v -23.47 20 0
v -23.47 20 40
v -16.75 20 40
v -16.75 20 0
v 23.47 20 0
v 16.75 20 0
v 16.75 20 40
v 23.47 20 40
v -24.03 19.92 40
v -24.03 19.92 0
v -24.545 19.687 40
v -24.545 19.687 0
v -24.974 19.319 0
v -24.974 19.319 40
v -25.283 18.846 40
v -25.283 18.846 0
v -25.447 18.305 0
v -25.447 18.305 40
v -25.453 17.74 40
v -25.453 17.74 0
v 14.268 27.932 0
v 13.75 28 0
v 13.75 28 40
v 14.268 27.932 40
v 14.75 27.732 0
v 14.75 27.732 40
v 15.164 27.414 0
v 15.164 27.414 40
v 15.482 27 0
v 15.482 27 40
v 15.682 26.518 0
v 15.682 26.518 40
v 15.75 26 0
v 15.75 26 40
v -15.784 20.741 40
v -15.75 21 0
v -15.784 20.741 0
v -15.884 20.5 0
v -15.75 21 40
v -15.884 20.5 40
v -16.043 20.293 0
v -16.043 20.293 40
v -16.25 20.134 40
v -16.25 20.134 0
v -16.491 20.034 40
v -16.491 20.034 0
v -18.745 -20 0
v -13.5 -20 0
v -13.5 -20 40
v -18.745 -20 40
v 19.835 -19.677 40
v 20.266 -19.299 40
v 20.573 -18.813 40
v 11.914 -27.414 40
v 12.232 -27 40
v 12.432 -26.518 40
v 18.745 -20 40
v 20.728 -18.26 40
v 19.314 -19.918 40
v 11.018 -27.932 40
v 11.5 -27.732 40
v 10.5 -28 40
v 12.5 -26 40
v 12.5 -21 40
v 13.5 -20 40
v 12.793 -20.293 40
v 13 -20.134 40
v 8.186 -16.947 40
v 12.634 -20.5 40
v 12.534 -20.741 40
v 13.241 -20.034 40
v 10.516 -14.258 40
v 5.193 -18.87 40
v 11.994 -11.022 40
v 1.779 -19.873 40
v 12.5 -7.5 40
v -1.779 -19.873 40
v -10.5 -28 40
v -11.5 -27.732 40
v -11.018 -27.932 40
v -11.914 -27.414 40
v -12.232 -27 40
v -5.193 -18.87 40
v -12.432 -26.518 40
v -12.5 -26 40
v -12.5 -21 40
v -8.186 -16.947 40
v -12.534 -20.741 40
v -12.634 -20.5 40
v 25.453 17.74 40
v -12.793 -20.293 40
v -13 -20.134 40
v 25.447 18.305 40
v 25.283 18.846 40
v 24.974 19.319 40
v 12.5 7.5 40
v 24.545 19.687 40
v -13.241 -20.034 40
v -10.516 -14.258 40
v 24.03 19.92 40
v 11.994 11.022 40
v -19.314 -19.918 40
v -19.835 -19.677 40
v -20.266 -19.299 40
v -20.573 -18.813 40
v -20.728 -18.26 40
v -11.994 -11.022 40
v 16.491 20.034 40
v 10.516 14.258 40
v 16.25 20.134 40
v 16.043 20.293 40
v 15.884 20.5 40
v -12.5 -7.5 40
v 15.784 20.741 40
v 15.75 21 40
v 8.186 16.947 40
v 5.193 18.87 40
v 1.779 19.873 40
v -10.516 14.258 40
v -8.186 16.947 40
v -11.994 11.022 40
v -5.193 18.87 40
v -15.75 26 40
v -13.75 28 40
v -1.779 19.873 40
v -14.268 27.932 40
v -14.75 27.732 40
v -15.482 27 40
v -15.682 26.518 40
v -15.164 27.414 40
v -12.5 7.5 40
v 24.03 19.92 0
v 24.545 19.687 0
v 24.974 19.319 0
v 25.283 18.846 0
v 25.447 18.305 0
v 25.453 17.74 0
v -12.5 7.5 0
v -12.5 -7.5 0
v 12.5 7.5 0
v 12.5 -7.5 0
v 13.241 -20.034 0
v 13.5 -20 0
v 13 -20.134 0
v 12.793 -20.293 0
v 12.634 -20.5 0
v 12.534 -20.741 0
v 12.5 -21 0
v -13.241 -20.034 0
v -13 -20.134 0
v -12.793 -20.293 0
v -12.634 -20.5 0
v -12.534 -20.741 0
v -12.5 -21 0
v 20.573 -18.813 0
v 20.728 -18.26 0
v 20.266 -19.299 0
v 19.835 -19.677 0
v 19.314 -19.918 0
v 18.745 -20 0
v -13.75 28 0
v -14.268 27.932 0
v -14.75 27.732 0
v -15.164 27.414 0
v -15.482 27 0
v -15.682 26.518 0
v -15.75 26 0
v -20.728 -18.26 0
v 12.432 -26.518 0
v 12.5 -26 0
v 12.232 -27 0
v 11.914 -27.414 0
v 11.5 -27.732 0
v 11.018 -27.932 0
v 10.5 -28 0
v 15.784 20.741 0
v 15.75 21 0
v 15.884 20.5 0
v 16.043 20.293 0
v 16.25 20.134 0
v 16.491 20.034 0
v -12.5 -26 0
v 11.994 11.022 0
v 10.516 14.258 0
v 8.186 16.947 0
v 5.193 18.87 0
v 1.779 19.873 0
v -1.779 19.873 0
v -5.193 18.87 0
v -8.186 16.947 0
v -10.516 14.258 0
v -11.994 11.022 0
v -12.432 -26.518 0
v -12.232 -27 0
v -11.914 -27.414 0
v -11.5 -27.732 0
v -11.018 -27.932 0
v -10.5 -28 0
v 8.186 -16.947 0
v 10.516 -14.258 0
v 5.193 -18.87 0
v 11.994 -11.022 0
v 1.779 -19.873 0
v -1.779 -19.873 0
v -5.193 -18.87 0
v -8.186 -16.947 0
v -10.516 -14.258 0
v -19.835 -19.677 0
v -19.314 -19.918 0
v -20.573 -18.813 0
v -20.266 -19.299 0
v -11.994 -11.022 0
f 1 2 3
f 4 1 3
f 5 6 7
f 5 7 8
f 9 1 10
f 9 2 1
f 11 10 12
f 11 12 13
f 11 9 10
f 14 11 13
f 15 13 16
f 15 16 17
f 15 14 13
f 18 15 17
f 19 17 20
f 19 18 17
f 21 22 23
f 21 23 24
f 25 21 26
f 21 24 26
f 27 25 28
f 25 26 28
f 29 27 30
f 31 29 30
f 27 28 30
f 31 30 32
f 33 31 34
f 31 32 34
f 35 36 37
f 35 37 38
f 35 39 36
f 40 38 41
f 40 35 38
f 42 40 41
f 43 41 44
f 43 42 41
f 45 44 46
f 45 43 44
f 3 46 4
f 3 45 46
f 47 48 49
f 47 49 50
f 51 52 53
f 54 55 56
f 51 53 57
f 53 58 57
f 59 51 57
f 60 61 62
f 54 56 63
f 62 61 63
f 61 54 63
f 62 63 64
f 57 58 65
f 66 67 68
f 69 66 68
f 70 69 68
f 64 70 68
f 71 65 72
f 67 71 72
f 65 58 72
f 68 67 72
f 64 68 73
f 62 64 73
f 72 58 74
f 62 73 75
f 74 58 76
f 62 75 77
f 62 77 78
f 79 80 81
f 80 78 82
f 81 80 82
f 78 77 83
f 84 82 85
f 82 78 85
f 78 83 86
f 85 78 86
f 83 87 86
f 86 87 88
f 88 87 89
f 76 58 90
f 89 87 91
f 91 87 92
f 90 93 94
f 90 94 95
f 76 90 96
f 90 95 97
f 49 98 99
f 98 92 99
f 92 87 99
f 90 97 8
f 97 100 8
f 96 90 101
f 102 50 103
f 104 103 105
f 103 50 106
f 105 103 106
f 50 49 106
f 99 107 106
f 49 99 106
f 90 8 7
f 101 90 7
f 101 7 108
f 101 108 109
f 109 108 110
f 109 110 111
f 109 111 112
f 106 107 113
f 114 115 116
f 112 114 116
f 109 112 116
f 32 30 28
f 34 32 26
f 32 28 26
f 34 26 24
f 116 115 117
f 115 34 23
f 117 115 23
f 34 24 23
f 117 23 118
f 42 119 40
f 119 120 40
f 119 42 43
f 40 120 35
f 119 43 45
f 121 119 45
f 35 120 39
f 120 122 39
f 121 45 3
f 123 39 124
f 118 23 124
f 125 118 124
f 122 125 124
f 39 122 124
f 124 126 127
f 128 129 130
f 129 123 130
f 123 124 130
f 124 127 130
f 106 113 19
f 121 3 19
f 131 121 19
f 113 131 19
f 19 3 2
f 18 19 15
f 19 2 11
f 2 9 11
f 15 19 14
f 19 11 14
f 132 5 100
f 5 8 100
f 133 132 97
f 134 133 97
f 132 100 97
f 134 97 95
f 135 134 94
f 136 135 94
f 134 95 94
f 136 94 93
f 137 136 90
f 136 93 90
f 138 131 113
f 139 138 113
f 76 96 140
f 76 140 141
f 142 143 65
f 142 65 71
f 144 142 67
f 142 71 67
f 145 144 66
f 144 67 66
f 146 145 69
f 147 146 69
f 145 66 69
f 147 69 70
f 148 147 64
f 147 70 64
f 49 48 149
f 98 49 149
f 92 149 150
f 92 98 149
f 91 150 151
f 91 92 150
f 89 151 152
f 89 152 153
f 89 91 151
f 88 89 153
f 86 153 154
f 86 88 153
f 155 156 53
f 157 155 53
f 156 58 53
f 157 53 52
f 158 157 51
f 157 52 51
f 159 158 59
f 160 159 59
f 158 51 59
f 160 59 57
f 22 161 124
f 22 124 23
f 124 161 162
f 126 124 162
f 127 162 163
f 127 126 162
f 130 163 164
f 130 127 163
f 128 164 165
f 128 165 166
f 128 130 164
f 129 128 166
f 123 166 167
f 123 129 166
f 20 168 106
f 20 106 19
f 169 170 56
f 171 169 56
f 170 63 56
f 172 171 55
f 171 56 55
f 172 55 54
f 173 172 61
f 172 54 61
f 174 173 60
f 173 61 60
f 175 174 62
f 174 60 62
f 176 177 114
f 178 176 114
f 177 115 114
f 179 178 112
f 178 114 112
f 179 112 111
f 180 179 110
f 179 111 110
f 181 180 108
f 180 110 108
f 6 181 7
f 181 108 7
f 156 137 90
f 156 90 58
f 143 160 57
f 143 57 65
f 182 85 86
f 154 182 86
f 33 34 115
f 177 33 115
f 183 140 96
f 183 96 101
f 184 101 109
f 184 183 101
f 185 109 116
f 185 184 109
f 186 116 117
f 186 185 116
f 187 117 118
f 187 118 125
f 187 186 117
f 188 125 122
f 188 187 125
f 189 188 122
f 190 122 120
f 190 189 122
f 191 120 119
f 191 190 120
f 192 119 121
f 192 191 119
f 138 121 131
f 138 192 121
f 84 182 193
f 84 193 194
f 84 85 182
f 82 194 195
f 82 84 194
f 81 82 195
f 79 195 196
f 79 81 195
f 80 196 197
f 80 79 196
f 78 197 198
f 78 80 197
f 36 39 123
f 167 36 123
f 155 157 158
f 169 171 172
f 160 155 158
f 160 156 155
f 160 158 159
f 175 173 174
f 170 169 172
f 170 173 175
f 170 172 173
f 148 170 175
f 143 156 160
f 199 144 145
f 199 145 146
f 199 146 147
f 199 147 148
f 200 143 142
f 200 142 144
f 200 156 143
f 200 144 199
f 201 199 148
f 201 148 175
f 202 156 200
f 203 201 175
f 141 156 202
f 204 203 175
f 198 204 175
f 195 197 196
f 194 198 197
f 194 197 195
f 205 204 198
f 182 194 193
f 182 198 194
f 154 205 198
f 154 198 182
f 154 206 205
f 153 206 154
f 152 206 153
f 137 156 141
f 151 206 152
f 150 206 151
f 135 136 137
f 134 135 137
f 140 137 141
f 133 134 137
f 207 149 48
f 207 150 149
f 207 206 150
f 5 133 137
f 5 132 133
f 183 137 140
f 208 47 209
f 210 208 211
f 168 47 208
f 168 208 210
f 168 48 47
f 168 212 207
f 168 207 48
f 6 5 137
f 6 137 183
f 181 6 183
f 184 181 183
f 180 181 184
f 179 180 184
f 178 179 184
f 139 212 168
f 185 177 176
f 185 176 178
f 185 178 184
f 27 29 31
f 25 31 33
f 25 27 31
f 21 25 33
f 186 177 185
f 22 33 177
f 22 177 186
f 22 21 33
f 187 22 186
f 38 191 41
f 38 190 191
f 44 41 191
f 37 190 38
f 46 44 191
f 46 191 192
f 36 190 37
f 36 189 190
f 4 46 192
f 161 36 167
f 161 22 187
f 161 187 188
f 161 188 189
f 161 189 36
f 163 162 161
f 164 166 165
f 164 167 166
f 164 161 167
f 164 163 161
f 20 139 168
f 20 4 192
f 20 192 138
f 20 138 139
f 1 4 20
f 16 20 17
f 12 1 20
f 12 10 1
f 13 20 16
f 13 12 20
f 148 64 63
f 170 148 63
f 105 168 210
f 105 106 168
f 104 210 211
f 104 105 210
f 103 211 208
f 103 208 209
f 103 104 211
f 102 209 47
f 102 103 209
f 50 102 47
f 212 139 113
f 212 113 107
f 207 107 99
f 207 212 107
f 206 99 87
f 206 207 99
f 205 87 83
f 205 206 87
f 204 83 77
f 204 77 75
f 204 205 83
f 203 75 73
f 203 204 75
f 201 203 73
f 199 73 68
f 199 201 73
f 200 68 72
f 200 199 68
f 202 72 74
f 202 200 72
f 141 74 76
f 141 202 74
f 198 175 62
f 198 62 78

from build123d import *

# Parameters (mm, degrees)
PAD_DEPTH   = 40
FILLET_R    = 2
FILLET001_R = 1


with BuildPart() as part:
    # Sketch → Pad (new body)
    with BuildSketch(Plane.XY):
        Polygon((-15.75, 28), (15.75, 28), (15.75, 20), (25.75, 20), (20.5, -20), (12.5, -20), (12.5, -28), (-12.5, -28), (-12.5, -20), (-20.5, -20), (-25.75, 20), (-15.75, 20), align=None)
        with BuildLine():
            ThreePointArc((12.5, 7.5), (0, 20), (-12.5, 7.5))
            Line((-12.5, 7.5), (-12.5, -7.5))
            ThreePointArc((-12.5, -7.5), (0, -20), (12.5, -7.5))
            Line((12.5, 7.5), (12.5, -7.5))
        make_face(mode=Mode.SUBTRACT)
    extrude(amount=PAD_DEPTH)

    # Fillet
    fillet_edges = [part.edges().sort_by_distance(p)[0] for p in [
        (25.75, 20, 20),
        (15.75, 28, 20),
        (-15.75, 28, 20),
        (-25.75, 20, 20),
        (-20.5, -20, 20),
        (-12.5, -28, 20),
        (12.5, -28, 20),
        (20.5, -20, 20),
    ]]
    fillet(fillet_edges, radius=FILLET_R)

    # Fillet001
    fillet001_edges = [part.edges().sort_by_distance(p)[0] for p in [
        (15.75, 20, 20),
        (-15.75, 20, 20),
        (12.5, -20, 20),
        (-12.5, -20, 20),
    ]]
    fillet(fillet001_edges, radius=FILLET001_R)


solid = part.part
